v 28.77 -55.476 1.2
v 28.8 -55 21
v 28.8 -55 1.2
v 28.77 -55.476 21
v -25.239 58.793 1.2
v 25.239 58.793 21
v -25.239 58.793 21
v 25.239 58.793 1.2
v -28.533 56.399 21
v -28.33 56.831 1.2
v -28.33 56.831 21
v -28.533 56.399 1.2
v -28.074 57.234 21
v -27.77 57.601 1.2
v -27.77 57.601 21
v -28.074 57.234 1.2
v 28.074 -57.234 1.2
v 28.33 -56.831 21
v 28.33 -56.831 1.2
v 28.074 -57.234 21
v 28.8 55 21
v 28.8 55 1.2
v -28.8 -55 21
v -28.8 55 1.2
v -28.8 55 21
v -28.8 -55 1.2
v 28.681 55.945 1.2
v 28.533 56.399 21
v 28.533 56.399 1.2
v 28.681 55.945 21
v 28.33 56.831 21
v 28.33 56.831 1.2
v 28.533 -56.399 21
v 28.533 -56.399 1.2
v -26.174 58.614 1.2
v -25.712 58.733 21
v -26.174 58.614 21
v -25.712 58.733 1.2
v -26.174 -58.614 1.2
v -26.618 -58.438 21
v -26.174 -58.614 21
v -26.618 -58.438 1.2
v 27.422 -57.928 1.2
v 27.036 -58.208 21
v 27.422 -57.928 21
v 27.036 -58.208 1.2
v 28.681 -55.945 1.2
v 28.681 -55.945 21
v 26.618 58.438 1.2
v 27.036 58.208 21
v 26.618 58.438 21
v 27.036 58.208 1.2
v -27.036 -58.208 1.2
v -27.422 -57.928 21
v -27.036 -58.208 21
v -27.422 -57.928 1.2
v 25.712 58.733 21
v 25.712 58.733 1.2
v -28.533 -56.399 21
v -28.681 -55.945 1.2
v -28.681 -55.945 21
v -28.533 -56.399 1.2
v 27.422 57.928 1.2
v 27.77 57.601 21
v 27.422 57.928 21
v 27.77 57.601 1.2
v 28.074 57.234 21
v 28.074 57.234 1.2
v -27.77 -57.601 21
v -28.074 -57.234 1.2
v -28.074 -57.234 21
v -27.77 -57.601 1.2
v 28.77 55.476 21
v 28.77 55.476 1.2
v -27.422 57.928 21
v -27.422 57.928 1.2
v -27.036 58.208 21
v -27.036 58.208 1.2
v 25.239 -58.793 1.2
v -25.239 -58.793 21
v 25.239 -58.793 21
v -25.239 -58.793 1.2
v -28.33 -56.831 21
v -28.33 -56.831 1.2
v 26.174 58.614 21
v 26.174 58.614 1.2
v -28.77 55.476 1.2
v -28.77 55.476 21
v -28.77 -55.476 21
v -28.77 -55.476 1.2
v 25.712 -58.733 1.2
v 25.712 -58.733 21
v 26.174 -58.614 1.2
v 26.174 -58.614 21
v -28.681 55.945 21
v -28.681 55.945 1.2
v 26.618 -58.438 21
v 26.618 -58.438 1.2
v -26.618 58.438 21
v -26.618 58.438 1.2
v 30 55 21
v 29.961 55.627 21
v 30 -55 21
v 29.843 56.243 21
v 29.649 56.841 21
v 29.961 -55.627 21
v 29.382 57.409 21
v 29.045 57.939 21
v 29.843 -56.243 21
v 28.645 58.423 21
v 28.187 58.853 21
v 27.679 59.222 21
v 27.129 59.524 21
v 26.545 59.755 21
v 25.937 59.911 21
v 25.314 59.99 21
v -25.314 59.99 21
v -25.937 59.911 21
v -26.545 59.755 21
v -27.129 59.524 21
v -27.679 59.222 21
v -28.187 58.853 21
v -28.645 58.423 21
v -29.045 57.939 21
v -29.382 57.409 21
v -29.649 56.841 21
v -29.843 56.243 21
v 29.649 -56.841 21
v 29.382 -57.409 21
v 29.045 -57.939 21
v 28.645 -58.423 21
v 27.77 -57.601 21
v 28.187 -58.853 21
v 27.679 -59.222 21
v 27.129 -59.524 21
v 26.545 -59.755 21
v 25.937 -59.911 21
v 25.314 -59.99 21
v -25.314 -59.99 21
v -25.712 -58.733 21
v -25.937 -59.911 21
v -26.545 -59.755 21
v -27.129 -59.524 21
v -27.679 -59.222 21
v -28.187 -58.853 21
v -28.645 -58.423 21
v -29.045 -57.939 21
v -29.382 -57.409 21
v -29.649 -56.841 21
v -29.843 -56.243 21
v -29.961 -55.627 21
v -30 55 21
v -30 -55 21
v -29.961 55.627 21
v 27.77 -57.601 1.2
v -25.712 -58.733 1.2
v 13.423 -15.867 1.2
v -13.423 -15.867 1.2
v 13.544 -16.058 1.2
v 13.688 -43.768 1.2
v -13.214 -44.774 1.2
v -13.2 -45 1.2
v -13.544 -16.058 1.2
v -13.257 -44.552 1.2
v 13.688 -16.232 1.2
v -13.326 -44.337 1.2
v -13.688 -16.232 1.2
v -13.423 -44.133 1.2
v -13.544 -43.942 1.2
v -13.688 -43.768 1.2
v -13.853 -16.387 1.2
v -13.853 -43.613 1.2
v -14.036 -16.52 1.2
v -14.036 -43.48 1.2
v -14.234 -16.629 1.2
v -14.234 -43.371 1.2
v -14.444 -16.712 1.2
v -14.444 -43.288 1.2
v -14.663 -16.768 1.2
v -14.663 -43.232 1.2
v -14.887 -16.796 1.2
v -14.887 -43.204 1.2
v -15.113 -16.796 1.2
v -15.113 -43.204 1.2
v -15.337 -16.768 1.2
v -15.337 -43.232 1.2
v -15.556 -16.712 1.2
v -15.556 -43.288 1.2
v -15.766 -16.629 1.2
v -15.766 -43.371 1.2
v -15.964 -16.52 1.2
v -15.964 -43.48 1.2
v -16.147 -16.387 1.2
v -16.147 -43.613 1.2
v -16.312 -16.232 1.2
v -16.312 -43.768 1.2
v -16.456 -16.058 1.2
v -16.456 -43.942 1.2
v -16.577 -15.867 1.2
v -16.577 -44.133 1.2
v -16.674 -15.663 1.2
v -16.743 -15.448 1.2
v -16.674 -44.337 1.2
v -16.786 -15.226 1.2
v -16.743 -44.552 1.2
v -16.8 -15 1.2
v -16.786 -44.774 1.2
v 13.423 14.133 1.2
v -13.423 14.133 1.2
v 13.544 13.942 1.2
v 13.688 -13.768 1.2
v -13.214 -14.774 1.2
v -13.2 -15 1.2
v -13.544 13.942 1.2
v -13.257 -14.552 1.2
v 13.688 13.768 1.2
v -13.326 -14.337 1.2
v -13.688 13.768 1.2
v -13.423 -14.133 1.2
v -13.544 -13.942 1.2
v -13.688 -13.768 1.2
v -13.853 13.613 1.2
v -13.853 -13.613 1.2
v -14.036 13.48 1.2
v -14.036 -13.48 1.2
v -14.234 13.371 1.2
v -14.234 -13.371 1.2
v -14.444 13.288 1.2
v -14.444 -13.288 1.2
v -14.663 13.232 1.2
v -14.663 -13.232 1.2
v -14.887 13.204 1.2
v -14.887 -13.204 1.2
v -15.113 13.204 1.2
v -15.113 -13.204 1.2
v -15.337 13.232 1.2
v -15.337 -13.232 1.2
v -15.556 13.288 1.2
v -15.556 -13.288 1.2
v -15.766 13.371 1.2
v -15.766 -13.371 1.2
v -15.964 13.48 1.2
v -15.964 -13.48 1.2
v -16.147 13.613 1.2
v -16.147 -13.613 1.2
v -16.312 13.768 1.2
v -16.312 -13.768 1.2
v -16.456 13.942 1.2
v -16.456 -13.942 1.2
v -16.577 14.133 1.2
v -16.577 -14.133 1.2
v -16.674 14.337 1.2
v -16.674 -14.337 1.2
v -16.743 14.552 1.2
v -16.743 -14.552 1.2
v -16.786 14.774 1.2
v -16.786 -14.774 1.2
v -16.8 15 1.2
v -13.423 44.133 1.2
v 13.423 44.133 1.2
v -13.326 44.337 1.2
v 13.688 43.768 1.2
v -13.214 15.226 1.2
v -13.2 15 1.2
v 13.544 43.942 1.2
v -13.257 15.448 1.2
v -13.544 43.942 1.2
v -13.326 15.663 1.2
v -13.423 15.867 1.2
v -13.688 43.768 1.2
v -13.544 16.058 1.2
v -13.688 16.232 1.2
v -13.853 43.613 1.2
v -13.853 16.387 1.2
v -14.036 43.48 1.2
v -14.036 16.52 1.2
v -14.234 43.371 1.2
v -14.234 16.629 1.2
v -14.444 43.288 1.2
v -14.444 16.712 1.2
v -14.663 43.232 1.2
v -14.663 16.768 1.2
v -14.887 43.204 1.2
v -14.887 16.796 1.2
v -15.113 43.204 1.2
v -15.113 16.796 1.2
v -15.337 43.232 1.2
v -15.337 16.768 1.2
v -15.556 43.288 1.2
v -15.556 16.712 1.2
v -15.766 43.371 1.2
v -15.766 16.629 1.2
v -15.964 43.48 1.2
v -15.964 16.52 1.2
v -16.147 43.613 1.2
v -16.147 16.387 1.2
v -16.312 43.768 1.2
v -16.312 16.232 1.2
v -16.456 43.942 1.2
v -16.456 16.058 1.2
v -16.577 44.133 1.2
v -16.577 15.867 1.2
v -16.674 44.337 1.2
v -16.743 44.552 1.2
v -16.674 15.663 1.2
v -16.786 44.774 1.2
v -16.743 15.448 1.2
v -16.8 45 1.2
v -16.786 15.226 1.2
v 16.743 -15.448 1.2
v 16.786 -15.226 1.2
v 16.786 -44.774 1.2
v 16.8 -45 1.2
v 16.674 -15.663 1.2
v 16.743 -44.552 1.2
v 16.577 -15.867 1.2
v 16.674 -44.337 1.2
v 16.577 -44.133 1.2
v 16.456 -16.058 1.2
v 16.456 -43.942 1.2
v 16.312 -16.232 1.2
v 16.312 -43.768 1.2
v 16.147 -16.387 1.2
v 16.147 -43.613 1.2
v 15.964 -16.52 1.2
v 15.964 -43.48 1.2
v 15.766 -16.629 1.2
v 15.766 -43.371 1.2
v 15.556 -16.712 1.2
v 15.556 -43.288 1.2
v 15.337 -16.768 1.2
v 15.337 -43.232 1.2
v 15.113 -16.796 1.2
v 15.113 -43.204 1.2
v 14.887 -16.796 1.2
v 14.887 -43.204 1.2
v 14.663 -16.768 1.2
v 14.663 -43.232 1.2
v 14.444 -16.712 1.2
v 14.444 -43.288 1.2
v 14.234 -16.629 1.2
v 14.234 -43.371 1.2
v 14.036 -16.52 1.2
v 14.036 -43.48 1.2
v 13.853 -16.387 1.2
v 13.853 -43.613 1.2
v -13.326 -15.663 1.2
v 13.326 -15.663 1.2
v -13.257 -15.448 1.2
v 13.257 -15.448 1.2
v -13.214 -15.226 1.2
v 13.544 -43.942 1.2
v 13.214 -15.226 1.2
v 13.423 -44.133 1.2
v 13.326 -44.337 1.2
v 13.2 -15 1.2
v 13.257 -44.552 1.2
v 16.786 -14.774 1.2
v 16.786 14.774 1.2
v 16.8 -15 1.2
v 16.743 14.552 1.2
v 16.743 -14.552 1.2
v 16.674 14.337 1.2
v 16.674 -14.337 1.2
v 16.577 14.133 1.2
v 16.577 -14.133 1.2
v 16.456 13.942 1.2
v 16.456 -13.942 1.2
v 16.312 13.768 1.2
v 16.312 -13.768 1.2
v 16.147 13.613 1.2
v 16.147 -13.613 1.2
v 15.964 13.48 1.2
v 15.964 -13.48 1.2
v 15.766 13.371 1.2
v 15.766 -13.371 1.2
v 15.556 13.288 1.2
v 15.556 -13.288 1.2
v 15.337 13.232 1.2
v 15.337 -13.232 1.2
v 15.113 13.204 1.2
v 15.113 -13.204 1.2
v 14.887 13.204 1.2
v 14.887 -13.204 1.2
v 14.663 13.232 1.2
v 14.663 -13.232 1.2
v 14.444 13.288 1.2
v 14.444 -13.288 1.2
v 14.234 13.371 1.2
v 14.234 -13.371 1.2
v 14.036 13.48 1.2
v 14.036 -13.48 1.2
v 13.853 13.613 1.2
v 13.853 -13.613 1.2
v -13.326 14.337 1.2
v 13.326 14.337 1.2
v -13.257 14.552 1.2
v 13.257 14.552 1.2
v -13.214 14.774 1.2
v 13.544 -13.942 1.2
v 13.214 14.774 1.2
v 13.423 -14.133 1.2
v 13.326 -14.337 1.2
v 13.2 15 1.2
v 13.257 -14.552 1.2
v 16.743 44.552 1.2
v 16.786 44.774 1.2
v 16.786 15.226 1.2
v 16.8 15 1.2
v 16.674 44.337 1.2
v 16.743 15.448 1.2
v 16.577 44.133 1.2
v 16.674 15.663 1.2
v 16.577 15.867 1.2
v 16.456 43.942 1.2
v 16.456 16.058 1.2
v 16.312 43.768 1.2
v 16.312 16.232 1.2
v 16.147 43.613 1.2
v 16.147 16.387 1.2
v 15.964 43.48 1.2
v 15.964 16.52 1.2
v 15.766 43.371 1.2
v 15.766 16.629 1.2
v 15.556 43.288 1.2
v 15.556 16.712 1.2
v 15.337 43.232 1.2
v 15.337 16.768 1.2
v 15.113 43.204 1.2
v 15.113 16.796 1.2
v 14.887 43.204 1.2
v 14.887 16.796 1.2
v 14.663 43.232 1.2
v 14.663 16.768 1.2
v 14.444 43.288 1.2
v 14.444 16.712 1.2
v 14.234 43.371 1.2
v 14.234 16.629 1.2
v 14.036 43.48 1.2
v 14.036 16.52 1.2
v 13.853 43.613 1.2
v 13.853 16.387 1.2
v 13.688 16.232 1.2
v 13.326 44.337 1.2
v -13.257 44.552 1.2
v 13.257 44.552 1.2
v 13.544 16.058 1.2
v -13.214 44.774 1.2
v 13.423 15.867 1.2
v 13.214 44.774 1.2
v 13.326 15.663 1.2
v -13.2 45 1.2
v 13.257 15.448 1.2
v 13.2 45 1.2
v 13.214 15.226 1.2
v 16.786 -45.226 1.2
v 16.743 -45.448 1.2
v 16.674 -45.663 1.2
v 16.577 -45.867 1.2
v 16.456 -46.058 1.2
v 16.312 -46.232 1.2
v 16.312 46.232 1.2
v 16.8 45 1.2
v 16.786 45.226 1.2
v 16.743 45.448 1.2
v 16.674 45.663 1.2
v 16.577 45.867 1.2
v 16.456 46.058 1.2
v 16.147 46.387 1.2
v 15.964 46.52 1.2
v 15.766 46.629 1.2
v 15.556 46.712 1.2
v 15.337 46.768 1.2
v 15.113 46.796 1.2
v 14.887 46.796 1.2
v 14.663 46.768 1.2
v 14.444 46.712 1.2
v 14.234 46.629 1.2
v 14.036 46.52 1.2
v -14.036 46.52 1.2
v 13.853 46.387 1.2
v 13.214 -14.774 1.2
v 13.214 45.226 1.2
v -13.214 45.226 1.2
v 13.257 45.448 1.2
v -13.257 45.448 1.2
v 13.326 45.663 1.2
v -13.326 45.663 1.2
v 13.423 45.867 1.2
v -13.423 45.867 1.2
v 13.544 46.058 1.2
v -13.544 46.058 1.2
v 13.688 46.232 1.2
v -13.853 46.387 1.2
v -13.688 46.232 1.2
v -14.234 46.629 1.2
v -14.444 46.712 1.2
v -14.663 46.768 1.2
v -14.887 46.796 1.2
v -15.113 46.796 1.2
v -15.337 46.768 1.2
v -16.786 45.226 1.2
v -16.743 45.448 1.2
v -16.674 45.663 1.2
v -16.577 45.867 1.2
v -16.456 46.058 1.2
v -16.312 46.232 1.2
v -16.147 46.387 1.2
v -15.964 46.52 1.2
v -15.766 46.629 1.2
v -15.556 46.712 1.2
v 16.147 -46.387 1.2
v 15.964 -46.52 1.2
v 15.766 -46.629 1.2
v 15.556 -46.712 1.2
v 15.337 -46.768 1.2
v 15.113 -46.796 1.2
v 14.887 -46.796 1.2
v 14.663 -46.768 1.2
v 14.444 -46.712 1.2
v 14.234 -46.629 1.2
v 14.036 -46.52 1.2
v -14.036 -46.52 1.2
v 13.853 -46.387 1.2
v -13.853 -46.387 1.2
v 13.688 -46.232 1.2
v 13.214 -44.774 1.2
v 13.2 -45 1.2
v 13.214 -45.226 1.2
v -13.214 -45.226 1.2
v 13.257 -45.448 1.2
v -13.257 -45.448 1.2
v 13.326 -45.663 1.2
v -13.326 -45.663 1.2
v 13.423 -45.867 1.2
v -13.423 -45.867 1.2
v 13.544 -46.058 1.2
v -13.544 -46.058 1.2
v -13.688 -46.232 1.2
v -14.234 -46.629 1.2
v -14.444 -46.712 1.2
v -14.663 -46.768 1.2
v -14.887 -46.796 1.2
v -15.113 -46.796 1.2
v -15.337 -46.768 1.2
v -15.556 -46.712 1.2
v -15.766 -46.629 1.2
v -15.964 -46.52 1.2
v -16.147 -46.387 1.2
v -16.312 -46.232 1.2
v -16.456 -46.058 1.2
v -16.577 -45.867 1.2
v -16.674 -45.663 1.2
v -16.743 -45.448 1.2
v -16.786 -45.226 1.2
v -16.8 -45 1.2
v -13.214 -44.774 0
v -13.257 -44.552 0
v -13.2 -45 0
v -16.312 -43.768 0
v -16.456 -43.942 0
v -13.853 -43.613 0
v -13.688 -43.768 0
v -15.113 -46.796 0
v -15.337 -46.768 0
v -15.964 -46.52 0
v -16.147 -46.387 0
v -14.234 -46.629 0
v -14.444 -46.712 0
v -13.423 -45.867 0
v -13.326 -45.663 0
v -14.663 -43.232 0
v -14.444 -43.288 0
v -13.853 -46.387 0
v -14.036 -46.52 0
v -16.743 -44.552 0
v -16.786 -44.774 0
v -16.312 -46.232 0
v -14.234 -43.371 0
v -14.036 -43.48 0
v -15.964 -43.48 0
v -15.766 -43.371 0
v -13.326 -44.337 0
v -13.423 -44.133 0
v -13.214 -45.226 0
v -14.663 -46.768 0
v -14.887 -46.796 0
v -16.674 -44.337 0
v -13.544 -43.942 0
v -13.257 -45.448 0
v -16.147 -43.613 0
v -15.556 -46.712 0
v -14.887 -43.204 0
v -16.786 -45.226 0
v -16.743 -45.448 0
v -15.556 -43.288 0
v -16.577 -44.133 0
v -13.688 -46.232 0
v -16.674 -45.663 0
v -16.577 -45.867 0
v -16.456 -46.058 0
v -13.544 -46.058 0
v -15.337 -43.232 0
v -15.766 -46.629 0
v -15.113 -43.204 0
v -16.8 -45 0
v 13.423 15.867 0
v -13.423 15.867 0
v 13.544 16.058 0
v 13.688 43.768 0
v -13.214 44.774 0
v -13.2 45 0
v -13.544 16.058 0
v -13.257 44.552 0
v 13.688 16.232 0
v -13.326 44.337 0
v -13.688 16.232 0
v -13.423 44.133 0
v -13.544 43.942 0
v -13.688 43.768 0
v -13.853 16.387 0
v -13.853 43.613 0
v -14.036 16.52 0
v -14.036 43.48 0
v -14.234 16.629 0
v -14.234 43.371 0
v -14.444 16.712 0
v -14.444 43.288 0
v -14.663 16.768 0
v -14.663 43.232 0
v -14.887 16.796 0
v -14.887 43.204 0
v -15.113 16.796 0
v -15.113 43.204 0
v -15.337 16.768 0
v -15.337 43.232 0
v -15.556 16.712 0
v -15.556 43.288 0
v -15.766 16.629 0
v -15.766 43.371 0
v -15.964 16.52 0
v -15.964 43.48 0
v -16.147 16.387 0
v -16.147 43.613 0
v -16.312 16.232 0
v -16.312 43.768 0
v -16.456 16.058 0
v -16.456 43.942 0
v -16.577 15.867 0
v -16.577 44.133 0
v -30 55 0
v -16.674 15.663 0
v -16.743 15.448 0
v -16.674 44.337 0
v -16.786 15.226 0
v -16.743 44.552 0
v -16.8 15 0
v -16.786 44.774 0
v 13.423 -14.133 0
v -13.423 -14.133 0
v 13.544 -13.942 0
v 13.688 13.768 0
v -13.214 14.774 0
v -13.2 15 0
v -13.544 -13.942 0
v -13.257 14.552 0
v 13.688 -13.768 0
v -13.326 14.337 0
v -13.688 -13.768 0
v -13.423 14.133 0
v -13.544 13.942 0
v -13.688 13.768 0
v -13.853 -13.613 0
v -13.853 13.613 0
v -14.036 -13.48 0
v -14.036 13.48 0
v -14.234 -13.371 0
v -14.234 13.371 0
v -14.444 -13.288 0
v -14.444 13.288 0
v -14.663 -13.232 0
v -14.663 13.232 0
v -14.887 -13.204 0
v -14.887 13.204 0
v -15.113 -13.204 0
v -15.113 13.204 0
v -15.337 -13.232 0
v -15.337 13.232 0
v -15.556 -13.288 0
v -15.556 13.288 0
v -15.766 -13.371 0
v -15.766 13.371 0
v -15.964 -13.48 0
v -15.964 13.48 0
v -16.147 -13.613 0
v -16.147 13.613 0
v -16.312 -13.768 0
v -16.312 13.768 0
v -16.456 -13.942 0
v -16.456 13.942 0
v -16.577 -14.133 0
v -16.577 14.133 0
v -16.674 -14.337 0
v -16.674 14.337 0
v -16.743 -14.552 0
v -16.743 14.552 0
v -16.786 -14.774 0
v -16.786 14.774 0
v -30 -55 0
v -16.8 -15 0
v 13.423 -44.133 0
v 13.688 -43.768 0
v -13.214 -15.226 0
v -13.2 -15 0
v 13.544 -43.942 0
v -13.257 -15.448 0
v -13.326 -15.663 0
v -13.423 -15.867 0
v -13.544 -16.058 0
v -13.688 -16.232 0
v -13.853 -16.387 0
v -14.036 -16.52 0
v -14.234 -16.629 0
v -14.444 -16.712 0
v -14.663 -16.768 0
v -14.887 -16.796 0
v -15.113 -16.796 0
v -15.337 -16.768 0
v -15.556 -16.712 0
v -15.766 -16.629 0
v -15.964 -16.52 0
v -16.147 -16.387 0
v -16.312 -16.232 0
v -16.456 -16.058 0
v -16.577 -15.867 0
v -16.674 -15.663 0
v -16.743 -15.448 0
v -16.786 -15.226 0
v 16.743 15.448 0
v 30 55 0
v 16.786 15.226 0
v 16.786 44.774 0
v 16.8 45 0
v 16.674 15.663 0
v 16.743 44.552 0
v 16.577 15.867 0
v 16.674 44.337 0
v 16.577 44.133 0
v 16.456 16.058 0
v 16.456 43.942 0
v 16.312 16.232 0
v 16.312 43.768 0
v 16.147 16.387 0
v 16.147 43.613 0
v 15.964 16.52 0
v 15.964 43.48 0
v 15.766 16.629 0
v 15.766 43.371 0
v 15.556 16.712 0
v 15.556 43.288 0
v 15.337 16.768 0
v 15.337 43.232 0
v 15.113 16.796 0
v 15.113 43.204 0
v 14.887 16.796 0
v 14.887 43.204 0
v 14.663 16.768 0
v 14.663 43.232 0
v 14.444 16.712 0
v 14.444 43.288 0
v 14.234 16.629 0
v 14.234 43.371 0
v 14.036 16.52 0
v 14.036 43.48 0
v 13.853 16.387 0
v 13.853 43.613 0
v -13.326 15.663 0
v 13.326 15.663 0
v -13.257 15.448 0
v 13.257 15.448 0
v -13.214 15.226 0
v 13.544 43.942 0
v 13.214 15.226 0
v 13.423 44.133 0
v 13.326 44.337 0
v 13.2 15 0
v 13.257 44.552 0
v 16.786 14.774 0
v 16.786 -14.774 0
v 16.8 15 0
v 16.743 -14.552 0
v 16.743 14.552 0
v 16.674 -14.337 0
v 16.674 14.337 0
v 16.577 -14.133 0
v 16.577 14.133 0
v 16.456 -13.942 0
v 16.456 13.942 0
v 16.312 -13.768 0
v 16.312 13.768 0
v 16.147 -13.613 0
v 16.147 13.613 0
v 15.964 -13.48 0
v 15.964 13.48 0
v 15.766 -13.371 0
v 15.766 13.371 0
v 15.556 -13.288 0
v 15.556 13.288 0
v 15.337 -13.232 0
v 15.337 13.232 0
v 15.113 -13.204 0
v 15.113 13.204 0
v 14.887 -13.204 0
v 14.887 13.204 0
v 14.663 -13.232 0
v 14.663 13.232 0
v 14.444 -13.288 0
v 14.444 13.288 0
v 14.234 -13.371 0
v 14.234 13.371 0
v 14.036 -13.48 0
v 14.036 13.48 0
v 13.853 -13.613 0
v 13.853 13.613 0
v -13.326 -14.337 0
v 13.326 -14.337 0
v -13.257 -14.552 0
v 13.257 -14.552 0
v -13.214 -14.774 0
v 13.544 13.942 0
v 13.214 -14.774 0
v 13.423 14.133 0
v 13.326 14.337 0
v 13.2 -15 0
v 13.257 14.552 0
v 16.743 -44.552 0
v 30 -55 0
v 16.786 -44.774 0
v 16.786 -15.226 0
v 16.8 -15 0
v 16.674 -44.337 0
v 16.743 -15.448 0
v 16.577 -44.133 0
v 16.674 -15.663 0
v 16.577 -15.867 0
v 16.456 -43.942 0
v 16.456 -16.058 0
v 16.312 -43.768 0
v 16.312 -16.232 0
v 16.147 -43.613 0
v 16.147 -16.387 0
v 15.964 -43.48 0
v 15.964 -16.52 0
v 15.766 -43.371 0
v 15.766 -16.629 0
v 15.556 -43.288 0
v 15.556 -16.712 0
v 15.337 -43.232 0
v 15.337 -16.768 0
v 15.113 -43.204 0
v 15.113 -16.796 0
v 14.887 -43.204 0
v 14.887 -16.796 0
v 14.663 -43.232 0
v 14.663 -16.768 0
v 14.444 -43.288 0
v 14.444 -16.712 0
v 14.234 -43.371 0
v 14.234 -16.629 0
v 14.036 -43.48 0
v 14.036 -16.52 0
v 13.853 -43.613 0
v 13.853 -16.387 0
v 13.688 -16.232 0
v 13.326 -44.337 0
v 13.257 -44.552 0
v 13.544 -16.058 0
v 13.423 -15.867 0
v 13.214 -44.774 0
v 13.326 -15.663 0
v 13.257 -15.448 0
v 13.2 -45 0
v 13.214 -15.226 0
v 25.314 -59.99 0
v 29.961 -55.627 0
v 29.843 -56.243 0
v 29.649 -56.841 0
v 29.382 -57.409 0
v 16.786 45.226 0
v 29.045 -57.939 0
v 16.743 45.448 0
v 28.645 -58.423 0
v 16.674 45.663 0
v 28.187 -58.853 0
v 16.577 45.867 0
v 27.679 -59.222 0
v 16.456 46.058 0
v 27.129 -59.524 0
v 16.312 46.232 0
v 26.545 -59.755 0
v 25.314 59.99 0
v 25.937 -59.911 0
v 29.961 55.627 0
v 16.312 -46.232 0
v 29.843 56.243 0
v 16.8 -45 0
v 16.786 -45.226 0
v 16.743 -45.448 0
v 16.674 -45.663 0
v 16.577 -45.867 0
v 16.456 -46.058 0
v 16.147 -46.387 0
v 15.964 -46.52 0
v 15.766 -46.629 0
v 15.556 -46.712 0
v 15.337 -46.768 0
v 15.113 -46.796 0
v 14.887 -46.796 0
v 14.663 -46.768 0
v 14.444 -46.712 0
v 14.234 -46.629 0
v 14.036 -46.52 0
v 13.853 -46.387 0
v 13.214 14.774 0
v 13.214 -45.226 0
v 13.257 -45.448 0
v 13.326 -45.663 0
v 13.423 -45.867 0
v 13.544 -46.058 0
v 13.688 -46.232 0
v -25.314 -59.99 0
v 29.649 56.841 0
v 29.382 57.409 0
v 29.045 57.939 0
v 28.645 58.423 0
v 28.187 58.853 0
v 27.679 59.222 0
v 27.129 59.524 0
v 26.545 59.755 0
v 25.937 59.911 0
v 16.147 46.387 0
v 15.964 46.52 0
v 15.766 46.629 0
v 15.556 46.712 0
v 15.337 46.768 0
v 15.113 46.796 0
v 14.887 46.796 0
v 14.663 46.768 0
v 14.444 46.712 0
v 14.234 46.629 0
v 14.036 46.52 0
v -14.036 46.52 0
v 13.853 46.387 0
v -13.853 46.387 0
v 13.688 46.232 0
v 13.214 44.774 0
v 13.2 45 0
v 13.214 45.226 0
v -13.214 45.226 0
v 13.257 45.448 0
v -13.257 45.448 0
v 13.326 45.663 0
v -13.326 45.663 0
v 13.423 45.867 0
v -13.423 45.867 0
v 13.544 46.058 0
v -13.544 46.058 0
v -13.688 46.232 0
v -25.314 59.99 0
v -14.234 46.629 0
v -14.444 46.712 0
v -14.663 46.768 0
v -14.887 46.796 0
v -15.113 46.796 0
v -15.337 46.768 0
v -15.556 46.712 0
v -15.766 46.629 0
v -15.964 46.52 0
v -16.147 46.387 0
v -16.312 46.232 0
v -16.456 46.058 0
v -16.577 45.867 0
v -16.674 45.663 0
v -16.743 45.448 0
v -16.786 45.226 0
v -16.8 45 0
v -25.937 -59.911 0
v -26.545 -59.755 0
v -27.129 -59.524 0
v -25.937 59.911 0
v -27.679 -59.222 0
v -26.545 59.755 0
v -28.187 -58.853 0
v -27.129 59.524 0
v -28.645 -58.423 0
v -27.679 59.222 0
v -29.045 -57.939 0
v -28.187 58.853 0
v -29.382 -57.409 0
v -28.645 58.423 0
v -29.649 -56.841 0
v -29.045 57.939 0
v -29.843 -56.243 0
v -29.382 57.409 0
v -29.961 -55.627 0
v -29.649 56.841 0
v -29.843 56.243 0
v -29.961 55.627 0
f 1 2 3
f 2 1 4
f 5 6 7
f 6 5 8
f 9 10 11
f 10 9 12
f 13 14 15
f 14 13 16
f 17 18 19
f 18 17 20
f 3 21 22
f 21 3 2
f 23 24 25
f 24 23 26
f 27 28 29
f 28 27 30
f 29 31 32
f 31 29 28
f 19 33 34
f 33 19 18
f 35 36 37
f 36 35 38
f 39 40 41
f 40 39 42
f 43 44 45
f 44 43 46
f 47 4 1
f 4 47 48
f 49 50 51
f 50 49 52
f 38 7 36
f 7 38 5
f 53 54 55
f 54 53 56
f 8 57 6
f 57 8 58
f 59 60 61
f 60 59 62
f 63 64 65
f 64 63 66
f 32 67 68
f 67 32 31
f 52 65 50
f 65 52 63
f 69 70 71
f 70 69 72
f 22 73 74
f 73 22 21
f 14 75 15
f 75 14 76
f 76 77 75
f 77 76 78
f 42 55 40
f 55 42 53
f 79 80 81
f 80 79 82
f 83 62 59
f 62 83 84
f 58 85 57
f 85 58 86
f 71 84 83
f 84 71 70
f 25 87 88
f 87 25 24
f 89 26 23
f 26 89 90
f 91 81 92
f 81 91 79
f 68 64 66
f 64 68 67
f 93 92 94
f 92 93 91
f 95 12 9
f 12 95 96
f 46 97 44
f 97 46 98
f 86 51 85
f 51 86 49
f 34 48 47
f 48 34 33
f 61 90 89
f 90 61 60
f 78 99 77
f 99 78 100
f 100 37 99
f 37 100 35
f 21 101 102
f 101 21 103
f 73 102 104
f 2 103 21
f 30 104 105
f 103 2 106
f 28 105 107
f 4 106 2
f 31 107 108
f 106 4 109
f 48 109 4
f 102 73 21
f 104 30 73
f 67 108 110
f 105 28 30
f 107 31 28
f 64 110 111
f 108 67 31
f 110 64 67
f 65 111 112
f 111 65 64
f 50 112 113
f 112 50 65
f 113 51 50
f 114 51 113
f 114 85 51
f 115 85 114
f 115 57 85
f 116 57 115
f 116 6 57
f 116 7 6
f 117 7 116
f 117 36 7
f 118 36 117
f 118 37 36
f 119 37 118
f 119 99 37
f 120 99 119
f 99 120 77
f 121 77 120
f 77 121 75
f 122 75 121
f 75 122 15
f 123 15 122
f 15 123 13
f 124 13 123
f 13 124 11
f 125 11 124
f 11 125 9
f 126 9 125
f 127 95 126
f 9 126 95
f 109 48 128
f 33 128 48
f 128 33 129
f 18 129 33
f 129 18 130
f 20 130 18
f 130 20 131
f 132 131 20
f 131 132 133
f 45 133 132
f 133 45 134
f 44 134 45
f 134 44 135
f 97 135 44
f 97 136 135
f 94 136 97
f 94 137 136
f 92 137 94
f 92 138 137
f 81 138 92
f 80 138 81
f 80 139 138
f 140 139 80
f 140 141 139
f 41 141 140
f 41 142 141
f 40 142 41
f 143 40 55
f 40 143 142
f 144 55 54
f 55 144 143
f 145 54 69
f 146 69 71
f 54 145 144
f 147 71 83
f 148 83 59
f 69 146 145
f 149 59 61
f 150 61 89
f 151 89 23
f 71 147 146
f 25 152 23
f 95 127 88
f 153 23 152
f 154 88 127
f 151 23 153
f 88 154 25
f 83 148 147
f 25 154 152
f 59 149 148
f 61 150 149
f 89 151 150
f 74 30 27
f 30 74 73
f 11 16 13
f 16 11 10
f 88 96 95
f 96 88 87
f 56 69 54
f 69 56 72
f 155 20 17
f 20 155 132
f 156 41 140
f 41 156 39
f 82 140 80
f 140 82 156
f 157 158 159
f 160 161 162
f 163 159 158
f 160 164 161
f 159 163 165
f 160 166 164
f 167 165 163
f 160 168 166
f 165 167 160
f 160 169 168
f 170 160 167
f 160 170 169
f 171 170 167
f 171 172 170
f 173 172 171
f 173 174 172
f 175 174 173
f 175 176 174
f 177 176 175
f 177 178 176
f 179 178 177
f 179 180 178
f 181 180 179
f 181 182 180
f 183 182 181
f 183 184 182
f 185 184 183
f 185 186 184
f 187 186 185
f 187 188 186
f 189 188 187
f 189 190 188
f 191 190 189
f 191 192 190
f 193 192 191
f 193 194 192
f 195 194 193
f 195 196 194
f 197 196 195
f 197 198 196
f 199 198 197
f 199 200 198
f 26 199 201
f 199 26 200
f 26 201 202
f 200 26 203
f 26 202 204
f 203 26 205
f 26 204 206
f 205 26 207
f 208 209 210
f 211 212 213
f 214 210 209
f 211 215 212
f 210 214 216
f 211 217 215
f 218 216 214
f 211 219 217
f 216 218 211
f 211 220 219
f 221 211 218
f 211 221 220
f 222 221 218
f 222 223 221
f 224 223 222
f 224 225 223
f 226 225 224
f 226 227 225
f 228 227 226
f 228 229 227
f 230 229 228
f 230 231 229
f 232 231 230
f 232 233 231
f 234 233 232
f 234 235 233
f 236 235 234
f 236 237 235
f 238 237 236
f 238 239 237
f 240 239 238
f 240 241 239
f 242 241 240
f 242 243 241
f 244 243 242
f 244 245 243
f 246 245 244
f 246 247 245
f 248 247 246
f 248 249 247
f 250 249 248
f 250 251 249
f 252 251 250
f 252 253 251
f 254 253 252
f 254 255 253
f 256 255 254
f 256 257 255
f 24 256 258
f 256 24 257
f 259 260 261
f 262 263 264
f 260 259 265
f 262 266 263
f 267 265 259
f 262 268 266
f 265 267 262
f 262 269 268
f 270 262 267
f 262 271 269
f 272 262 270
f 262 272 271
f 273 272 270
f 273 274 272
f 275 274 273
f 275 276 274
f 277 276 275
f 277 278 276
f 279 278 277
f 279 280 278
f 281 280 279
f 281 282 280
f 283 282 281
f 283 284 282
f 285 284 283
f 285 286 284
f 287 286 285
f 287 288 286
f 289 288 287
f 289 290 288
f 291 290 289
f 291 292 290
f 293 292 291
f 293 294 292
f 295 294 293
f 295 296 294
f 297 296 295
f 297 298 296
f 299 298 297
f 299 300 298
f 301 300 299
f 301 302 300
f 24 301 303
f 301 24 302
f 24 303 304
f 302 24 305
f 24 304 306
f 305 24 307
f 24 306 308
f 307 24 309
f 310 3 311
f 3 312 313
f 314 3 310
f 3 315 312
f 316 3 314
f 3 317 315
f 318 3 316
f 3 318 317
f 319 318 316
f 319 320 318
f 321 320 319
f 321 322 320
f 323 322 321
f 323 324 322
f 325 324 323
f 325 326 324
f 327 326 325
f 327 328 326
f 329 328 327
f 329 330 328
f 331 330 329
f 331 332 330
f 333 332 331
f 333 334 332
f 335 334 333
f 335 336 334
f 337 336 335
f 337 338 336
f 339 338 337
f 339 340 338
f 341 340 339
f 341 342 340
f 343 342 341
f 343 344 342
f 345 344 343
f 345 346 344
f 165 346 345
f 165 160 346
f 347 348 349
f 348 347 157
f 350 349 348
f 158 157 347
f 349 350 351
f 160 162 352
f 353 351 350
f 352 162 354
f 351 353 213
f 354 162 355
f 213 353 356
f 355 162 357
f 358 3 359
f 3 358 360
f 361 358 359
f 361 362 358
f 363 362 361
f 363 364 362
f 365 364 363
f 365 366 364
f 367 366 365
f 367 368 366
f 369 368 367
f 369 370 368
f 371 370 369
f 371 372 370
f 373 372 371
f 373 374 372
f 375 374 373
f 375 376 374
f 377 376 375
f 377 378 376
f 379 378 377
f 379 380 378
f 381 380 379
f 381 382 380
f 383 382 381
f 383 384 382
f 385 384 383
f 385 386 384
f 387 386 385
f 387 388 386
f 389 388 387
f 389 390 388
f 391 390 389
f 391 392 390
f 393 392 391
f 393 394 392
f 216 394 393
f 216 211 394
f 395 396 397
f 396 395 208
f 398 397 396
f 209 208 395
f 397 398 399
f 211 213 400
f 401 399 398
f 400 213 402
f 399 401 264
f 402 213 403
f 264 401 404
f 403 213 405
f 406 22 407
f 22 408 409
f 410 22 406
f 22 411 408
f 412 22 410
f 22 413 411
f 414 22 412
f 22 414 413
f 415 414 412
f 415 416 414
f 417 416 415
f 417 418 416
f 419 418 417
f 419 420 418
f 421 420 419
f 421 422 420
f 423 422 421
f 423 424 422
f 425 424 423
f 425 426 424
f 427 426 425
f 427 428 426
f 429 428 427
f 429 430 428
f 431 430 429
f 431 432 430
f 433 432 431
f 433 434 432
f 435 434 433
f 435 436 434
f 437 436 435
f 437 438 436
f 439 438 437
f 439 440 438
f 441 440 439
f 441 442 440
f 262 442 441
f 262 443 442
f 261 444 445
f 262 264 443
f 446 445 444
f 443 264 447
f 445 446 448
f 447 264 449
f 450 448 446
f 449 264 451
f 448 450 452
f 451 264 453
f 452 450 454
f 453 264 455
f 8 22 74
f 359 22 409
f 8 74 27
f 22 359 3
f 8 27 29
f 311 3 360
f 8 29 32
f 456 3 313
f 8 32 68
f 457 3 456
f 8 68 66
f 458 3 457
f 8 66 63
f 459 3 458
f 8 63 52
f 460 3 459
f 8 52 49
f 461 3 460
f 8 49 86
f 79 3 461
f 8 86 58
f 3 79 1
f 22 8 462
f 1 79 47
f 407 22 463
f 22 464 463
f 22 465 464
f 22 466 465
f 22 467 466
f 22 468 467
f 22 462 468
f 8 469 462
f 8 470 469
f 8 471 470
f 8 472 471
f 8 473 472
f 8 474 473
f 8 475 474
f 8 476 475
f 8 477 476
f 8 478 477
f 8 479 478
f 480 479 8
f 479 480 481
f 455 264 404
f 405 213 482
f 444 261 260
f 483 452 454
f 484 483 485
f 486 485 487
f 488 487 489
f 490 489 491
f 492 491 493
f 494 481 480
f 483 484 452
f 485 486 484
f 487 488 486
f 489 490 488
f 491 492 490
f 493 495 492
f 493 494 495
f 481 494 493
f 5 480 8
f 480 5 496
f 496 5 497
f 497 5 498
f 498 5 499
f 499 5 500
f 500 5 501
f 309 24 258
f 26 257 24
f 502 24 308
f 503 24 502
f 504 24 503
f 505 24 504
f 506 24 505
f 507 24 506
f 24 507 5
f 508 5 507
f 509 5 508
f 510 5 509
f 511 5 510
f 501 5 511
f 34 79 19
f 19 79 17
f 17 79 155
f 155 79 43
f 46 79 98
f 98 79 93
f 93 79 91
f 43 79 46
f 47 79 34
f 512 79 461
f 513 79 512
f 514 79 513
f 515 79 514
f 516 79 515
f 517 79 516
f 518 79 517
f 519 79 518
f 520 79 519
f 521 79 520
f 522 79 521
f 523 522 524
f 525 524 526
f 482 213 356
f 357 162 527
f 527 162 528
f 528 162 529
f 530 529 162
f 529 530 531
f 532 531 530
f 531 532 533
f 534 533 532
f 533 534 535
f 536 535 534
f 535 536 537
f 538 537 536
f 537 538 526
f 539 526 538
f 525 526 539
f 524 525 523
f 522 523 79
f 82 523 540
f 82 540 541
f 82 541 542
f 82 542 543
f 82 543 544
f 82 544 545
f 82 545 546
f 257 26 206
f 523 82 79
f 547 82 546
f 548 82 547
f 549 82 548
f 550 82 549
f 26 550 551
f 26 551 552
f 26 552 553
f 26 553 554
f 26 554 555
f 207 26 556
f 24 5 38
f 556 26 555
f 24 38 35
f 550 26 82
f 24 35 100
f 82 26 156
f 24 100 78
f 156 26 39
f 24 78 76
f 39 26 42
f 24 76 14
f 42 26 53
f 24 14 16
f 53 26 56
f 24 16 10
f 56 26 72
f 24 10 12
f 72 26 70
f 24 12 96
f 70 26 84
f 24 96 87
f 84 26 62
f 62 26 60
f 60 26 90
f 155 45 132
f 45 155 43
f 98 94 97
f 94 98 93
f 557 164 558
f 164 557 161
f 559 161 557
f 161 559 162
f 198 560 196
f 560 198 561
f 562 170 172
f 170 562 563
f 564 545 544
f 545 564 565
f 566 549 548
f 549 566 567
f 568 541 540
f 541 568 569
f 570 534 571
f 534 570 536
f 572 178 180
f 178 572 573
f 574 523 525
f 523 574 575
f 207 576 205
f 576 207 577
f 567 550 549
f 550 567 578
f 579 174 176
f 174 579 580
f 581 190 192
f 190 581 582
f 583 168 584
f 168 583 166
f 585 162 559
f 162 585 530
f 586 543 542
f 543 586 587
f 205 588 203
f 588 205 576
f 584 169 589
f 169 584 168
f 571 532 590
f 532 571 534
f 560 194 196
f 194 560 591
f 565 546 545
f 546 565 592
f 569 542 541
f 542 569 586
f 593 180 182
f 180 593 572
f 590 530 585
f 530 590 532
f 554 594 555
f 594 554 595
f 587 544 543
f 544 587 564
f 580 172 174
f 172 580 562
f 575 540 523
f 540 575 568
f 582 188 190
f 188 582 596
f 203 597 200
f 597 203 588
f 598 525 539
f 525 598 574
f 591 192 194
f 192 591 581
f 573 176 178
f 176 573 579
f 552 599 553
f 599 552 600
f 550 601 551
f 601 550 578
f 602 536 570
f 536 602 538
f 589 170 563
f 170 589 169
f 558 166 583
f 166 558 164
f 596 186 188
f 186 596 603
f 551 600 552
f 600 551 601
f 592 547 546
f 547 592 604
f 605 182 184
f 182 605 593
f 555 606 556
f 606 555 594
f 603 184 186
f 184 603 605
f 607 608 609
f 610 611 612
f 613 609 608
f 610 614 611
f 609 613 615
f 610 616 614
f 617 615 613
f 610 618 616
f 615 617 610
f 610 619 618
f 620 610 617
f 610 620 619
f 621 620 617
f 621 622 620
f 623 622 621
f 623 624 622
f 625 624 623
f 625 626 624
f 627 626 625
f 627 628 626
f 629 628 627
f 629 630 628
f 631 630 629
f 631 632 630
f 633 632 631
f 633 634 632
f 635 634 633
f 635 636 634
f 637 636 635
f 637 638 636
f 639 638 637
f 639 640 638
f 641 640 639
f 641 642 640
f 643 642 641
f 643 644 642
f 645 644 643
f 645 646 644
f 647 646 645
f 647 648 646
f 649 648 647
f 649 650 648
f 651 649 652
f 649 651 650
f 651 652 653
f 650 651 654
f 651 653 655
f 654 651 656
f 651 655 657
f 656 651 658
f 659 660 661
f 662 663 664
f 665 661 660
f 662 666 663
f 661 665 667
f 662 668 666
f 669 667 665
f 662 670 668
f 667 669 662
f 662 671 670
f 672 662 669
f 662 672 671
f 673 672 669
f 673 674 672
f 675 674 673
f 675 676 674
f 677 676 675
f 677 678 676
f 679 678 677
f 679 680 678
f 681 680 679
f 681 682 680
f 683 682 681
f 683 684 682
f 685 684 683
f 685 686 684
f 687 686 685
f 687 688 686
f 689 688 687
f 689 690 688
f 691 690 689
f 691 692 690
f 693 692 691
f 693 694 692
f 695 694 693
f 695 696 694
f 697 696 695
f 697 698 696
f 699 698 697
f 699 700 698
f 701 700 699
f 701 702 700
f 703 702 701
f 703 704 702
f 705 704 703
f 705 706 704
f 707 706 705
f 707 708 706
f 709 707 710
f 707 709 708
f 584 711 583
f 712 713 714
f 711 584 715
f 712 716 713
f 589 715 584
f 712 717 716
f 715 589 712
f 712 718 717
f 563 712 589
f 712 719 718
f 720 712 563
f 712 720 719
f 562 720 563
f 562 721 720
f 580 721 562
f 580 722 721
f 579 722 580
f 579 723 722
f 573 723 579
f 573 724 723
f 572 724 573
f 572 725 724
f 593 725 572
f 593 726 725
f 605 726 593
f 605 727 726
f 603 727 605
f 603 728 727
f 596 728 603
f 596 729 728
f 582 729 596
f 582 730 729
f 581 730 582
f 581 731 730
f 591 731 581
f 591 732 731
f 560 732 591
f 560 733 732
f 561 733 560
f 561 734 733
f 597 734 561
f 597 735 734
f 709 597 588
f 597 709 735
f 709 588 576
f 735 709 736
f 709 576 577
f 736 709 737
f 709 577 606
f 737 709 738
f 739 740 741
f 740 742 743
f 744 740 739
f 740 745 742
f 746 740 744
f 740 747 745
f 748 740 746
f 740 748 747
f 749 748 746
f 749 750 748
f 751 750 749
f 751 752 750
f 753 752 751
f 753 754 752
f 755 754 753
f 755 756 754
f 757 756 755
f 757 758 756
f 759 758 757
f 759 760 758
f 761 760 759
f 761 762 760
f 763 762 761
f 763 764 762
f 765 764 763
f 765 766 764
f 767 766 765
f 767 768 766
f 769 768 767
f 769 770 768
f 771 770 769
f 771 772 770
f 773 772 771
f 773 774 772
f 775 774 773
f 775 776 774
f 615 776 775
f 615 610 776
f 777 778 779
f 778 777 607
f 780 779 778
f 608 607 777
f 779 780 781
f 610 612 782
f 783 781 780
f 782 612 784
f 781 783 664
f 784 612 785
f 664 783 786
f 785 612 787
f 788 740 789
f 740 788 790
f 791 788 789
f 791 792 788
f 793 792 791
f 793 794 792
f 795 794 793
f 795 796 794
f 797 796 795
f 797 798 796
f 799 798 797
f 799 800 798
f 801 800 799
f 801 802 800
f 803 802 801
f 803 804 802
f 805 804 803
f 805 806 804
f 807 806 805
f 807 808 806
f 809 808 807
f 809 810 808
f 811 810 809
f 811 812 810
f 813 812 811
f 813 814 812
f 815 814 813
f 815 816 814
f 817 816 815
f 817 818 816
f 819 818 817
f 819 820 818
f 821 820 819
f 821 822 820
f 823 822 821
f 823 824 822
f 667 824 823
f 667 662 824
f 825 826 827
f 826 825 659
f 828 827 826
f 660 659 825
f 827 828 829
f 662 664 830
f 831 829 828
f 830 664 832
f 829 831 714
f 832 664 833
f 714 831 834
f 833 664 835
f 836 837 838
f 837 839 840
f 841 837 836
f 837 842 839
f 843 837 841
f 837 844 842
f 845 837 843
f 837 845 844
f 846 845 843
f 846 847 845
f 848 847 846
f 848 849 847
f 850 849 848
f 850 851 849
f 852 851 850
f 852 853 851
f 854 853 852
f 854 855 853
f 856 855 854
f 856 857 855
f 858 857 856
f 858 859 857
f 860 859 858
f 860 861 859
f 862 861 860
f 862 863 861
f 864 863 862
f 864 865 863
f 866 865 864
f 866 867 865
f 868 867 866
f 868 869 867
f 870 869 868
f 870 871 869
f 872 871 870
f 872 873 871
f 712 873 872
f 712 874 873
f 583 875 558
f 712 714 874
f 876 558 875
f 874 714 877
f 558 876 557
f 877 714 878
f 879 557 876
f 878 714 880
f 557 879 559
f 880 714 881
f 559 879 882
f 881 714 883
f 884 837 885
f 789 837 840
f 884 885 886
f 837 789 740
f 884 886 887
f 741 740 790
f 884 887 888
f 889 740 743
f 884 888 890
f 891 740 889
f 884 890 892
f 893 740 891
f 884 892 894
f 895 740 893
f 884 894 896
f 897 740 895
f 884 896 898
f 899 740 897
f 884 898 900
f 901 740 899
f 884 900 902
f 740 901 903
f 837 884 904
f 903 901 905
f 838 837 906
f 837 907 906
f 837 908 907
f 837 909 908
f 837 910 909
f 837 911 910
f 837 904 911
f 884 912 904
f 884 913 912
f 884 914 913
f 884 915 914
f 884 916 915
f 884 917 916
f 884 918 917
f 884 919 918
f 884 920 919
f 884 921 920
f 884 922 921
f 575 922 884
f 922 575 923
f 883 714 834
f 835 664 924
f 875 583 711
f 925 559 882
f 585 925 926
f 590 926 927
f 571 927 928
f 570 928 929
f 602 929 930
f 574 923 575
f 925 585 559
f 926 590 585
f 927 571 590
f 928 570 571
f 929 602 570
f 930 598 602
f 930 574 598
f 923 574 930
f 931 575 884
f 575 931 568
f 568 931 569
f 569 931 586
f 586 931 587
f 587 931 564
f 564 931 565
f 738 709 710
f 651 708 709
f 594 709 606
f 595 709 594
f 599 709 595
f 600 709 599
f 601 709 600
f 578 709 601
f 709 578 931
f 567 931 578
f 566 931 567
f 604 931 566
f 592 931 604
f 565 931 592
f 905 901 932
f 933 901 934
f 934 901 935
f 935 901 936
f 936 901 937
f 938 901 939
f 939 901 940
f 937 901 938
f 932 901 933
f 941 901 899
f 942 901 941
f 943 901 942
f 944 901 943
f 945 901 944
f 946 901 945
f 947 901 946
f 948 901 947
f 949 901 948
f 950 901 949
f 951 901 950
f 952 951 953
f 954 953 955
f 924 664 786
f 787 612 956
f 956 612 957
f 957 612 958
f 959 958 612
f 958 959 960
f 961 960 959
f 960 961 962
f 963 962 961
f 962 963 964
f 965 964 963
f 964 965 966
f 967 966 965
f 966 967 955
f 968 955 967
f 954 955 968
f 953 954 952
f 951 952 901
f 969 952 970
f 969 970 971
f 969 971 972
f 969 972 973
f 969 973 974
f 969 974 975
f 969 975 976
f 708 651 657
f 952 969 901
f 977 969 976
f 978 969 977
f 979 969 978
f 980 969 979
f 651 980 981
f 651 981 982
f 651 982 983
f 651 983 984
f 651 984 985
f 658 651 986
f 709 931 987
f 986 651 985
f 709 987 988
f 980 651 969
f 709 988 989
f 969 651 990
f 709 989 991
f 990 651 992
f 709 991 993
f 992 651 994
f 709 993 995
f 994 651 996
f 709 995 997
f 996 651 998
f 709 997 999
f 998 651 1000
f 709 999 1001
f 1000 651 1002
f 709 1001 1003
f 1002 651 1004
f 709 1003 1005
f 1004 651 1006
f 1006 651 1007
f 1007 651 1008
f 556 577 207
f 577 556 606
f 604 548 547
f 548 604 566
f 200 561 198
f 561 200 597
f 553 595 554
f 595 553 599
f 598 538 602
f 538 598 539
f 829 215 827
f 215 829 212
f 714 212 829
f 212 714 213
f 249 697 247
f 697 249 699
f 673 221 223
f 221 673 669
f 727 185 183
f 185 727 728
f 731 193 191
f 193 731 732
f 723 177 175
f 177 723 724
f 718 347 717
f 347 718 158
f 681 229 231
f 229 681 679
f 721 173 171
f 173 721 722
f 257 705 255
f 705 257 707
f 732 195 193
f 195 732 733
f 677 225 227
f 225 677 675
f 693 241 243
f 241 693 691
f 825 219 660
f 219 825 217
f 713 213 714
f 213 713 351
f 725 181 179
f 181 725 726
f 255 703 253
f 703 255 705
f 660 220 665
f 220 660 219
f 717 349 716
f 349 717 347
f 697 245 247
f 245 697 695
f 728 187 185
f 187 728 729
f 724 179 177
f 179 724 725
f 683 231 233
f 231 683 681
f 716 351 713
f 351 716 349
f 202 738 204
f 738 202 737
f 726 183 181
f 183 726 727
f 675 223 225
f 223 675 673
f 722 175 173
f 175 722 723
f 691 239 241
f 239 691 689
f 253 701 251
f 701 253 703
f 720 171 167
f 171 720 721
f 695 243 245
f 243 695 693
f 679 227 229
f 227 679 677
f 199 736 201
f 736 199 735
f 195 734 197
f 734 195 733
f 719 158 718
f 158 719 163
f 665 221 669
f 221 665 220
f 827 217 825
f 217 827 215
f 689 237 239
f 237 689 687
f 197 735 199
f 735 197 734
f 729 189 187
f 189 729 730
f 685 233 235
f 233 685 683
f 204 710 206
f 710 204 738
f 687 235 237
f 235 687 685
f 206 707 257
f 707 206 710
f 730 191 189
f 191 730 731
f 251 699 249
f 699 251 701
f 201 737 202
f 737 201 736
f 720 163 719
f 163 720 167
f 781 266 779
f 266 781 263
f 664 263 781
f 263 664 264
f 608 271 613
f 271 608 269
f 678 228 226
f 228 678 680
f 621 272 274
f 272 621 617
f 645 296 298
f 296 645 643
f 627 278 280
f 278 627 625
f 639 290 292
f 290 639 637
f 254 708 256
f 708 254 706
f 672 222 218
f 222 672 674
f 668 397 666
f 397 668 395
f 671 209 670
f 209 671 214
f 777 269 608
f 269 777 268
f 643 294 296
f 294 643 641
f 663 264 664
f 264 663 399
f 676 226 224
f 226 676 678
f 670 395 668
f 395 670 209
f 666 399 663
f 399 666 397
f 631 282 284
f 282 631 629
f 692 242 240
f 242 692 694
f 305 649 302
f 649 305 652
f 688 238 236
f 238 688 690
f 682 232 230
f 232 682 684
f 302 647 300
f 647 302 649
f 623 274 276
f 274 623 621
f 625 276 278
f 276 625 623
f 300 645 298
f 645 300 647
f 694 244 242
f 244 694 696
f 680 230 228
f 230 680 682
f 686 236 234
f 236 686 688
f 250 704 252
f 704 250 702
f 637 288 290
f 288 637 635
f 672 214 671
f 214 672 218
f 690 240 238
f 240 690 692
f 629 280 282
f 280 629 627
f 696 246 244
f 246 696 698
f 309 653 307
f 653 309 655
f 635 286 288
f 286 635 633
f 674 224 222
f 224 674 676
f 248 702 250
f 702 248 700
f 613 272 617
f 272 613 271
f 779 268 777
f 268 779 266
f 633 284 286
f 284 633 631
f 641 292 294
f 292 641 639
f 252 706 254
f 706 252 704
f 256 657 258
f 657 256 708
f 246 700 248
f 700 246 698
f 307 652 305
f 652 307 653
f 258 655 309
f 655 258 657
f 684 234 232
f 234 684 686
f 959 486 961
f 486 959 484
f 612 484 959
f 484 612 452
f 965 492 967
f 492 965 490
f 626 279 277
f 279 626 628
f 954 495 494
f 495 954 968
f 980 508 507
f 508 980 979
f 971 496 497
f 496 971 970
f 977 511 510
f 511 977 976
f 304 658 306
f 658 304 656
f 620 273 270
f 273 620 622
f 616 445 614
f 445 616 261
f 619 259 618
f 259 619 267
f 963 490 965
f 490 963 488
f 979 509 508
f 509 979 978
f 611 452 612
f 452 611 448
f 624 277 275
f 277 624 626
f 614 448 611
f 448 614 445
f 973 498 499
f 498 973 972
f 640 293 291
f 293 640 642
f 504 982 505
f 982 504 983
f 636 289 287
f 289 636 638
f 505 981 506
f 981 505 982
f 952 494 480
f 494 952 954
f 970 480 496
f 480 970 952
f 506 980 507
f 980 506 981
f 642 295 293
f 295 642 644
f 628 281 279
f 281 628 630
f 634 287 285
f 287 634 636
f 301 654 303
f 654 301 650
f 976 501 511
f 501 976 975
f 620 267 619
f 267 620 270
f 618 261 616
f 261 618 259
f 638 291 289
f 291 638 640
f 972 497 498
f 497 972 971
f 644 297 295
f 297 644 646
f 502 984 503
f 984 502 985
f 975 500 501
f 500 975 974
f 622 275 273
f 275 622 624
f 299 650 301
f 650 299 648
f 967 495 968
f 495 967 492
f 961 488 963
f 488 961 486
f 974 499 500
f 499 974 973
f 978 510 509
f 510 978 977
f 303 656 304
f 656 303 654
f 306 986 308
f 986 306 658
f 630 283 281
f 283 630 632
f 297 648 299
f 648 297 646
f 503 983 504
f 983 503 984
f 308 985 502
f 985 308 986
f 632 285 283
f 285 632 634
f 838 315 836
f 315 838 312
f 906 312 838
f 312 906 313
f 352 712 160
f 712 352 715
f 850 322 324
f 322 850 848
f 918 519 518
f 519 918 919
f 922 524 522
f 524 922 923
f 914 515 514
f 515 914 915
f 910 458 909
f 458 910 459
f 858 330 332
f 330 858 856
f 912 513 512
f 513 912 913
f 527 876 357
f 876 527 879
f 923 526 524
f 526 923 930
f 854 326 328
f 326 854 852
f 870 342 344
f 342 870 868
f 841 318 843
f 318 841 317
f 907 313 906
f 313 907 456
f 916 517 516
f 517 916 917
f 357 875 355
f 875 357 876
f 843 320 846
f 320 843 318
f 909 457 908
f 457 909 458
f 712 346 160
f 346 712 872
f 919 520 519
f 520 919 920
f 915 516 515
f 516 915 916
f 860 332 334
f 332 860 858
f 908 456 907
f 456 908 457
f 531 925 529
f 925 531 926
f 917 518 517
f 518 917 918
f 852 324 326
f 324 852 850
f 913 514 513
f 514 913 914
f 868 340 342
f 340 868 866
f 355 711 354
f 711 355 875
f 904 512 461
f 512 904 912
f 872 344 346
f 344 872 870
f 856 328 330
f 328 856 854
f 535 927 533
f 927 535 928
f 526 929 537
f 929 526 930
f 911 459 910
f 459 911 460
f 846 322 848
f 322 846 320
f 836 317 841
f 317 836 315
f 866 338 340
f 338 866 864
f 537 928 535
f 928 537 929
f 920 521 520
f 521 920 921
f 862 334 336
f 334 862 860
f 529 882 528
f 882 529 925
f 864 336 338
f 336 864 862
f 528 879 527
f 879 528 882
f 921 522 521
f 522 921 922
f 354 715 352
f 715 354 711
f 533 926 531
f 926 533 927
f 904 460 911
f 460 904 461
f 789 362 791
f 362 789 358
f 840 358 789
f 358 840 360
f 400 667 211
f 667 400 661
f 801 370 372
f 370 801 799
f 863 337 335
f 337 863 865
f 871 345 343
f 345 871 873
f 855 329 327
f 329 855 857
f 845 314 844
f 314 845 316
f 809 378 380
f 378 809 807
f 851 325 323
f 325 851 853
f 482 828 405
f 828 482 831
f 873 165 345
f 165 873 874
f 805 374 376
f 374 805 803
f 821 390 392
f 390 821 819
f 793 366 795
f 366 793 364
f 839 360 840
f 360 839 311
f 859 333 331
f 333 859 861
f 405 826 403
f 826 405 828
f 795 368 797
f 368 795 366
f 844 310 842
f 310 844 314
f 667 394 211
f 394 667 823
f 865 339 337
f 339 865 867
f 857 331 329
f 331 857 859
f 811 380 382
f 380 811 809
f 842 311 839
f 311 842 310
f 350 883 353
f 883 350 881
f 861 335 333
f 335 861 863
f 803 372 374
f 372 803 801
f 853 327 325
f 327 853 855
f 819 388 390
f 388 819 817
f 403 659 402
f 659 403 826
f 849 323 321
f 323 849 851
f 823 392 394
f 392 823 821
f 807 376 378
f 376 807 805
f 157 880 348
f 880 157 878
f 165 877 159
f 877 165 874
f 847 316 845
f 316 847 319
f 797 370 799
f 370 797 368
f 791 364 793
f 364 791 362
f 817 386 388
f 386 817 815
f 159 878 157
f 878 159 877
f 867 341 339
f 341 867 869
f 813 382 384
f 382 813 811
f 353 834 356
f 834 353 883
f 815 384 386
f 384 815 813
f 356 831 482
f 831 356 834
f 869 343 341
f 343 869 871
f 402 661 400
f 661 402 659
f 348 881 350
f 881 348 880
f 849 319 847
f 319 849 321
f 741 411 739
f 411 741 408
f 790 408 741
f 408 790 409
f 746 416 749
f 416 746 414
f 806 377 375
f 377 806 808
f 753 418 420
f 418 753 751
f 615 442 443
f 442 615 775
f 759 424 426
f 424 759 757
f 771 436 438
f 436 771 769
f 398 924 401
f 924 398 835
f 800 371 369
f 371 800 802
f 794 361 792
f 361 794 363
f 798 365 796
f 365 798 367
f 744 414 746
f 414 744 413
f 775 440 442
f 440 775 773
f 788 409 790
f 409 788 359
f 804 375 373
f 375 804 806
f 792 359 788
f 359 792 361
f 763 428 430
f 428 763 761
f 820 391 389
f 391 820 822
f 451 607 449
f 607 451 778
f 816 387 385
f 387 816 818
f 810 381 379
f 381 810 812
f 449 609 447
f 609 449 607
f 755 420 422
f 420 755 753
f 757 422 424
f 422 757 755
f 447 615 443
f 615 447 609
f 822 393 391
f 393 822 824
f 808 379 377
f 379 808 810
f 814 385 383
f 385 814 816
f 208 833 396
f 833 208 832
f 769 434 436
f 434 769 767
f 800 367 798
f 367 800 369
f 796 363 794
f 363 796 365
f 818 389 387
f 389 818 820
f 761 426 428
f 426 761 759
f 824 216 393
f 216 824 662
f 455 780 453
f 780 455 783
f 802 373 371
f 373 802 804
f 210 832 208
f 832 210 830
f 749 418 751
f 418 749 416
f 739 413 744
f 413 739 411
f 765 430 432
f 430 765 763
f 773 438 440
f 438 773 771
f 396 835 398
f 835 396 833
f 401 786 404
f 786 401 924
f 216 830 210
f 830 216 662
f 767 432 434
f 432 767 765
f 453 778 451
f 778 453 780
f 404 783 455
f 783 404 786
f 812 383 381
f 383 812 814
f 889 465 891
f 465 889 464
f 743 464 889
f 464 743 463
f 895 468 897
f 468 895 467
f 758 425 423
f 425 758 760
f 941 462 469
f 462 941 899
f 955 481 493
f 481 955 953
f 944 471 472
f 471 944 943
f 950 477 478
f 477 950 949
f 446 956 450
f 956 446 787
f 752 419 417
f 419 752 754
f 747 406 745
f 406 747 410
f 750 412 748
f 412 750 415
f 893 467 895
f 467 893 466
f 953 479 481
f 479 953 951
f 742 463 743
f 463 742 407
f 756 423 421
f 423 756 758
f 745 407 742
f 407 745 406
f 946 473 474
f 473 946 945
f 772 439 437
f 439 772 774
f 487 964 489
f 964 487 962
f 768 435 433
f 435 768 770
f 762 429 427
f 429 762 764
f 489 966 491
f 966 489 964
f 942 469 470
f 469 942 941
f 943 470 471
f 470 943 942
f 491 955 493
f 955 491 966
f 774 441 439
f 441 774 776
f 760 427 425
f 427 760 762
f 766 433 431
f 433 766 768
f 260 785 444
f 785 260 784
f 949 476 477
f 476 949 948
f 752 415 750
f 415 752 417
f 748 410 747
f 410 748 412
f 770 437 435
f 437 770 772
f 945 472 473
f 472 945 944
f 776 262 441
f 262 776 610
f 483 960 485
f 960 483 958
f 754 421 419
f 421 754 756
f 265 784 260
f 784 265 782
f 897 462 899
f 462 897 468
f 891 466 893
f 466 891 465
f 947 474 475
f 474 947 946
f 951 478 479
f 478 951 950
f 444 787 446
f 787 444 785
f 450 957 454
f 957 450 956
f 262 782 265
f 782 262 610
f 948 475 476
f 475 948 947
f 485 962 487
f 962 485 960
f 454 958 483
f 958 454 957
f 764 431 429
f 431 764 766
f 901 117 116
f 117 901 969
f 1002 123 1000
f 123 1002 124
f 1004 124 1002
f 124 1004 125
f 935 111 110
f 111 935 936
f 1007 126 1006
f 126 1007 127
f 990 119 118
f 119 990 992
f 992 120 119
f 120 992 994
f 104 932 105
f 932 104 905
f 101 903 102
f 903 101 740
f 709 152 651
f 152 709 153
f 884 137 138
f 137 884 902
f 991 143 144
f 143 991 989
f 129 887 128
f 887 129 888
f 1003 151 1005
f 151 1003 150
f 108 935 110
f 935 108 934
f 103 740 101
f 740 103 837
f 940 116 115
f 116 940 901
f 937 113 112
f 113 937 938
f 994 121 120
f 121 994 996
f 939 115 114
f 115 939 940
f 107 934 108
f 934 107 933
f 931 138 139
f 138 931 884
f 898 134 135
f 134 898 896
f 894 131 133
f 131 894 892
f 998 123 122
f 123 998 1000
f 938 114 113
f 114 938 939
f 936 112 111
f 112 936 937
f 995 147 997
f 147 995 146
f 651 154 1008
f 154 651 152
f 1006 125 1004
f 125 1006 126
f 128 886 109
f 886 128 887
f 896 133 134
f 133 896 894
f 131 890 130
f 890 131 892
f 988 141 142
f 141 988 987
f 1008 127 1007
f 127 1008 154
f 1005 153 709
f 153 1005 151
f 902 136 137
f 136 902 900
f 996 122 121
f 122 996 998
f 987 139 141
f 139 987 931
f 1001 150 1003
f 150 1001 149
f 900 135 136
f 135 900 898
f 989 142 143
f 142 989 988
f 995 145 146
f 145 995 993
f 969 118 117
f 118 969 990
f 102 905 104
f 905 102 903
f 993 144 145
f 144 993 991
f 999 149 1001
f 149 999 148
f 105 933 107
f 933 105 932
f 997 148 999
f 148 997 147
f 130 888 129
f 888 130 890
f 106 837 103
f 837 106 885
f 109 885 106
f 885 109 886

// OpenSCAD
$fn = 50;


difference() {
	union() {
		hull() {
			translate(v = [-25.0000000000, 55.0000000000, 0]) {
				cylinder(h = 21, r = 5);
			}
			translate(v = [25.0000000000, 55.0000000000, 0]) {
				cylinder(h = 21, r = 5);
			}
			translate(v = [-25.0000000000, -55.0000000000, 0]) {
				cylinder(h = 21, r = 5);
			}
			translate(v = [25.0000000000, -55.0000000000, 0]) {
				cylinder(h = 21, r = 5);
			}
		}
	}
	union() {
		translate(v = [0, 0, 1.2000000000]) {
			hull() {
				translate(v = [-25.0000000000, 55.0000000000, 0]) {
					cylinder(h = 19.8000000000, r = 3.8000000000);
				}
				translate(v = [25.0000000000, 55.0000000000, 0]) {
					cylinder(h = 19.8000000000, r = 3.8000000000);
				}
				translate(v = [-25.0000000000, -55.0000000000, 0]) {
					cylinder(h = 19.8000000000, r = 3.8000000000);
				}
				translate(v = [25.0000000000, -55.0000000000, 0]) {
					cylinder(h = 19.8000000000, r = 3.8000000000);
				}
			}
		}
		#translate(v = [-15.0000000000, -45.0000000000, 0]) {
			cylinder(h = 1.2000000000, r = 1.8000000000);
		}
		#translate(v = [-15.0000000000, -15.0000000000, 0]) {
			cylinder(h = 1.2000000000, r = 1.8000000000);
		}
		#translate(v = [-15.0000000000, 15.0000000000, 0]) {
			cylinder(h = 1.2000000000, r = 1.8000000000);
		}
		#translate(v = [-15.0000000000, 45.0000000000, 0]) {
			cylinder(h = 1.2000000000, r = 1.8000000000);
		}
		#translate(v = [15.0000000000, -45.0000000000, 0]) {
			cylinder(h = 1.2000000000, r = 1.8000000000);
		}
		#translate(v = [15.0000000000, -15.0000000000, 0]) {
			cylinder(h = 1.2000000000, r = 1.8000000000);
		}
		#translate(v = [15.0000000000, 15.0000000000, 0]) {
			cylinder(h = 1.2000000000, r = 1.8000000000);
		}
		#translate(v = [15.0000000000, 45.0000000000, 0]) {
			cylinder(h = 1.2000000000, r = 1.8000000000);
		}
	}
}
